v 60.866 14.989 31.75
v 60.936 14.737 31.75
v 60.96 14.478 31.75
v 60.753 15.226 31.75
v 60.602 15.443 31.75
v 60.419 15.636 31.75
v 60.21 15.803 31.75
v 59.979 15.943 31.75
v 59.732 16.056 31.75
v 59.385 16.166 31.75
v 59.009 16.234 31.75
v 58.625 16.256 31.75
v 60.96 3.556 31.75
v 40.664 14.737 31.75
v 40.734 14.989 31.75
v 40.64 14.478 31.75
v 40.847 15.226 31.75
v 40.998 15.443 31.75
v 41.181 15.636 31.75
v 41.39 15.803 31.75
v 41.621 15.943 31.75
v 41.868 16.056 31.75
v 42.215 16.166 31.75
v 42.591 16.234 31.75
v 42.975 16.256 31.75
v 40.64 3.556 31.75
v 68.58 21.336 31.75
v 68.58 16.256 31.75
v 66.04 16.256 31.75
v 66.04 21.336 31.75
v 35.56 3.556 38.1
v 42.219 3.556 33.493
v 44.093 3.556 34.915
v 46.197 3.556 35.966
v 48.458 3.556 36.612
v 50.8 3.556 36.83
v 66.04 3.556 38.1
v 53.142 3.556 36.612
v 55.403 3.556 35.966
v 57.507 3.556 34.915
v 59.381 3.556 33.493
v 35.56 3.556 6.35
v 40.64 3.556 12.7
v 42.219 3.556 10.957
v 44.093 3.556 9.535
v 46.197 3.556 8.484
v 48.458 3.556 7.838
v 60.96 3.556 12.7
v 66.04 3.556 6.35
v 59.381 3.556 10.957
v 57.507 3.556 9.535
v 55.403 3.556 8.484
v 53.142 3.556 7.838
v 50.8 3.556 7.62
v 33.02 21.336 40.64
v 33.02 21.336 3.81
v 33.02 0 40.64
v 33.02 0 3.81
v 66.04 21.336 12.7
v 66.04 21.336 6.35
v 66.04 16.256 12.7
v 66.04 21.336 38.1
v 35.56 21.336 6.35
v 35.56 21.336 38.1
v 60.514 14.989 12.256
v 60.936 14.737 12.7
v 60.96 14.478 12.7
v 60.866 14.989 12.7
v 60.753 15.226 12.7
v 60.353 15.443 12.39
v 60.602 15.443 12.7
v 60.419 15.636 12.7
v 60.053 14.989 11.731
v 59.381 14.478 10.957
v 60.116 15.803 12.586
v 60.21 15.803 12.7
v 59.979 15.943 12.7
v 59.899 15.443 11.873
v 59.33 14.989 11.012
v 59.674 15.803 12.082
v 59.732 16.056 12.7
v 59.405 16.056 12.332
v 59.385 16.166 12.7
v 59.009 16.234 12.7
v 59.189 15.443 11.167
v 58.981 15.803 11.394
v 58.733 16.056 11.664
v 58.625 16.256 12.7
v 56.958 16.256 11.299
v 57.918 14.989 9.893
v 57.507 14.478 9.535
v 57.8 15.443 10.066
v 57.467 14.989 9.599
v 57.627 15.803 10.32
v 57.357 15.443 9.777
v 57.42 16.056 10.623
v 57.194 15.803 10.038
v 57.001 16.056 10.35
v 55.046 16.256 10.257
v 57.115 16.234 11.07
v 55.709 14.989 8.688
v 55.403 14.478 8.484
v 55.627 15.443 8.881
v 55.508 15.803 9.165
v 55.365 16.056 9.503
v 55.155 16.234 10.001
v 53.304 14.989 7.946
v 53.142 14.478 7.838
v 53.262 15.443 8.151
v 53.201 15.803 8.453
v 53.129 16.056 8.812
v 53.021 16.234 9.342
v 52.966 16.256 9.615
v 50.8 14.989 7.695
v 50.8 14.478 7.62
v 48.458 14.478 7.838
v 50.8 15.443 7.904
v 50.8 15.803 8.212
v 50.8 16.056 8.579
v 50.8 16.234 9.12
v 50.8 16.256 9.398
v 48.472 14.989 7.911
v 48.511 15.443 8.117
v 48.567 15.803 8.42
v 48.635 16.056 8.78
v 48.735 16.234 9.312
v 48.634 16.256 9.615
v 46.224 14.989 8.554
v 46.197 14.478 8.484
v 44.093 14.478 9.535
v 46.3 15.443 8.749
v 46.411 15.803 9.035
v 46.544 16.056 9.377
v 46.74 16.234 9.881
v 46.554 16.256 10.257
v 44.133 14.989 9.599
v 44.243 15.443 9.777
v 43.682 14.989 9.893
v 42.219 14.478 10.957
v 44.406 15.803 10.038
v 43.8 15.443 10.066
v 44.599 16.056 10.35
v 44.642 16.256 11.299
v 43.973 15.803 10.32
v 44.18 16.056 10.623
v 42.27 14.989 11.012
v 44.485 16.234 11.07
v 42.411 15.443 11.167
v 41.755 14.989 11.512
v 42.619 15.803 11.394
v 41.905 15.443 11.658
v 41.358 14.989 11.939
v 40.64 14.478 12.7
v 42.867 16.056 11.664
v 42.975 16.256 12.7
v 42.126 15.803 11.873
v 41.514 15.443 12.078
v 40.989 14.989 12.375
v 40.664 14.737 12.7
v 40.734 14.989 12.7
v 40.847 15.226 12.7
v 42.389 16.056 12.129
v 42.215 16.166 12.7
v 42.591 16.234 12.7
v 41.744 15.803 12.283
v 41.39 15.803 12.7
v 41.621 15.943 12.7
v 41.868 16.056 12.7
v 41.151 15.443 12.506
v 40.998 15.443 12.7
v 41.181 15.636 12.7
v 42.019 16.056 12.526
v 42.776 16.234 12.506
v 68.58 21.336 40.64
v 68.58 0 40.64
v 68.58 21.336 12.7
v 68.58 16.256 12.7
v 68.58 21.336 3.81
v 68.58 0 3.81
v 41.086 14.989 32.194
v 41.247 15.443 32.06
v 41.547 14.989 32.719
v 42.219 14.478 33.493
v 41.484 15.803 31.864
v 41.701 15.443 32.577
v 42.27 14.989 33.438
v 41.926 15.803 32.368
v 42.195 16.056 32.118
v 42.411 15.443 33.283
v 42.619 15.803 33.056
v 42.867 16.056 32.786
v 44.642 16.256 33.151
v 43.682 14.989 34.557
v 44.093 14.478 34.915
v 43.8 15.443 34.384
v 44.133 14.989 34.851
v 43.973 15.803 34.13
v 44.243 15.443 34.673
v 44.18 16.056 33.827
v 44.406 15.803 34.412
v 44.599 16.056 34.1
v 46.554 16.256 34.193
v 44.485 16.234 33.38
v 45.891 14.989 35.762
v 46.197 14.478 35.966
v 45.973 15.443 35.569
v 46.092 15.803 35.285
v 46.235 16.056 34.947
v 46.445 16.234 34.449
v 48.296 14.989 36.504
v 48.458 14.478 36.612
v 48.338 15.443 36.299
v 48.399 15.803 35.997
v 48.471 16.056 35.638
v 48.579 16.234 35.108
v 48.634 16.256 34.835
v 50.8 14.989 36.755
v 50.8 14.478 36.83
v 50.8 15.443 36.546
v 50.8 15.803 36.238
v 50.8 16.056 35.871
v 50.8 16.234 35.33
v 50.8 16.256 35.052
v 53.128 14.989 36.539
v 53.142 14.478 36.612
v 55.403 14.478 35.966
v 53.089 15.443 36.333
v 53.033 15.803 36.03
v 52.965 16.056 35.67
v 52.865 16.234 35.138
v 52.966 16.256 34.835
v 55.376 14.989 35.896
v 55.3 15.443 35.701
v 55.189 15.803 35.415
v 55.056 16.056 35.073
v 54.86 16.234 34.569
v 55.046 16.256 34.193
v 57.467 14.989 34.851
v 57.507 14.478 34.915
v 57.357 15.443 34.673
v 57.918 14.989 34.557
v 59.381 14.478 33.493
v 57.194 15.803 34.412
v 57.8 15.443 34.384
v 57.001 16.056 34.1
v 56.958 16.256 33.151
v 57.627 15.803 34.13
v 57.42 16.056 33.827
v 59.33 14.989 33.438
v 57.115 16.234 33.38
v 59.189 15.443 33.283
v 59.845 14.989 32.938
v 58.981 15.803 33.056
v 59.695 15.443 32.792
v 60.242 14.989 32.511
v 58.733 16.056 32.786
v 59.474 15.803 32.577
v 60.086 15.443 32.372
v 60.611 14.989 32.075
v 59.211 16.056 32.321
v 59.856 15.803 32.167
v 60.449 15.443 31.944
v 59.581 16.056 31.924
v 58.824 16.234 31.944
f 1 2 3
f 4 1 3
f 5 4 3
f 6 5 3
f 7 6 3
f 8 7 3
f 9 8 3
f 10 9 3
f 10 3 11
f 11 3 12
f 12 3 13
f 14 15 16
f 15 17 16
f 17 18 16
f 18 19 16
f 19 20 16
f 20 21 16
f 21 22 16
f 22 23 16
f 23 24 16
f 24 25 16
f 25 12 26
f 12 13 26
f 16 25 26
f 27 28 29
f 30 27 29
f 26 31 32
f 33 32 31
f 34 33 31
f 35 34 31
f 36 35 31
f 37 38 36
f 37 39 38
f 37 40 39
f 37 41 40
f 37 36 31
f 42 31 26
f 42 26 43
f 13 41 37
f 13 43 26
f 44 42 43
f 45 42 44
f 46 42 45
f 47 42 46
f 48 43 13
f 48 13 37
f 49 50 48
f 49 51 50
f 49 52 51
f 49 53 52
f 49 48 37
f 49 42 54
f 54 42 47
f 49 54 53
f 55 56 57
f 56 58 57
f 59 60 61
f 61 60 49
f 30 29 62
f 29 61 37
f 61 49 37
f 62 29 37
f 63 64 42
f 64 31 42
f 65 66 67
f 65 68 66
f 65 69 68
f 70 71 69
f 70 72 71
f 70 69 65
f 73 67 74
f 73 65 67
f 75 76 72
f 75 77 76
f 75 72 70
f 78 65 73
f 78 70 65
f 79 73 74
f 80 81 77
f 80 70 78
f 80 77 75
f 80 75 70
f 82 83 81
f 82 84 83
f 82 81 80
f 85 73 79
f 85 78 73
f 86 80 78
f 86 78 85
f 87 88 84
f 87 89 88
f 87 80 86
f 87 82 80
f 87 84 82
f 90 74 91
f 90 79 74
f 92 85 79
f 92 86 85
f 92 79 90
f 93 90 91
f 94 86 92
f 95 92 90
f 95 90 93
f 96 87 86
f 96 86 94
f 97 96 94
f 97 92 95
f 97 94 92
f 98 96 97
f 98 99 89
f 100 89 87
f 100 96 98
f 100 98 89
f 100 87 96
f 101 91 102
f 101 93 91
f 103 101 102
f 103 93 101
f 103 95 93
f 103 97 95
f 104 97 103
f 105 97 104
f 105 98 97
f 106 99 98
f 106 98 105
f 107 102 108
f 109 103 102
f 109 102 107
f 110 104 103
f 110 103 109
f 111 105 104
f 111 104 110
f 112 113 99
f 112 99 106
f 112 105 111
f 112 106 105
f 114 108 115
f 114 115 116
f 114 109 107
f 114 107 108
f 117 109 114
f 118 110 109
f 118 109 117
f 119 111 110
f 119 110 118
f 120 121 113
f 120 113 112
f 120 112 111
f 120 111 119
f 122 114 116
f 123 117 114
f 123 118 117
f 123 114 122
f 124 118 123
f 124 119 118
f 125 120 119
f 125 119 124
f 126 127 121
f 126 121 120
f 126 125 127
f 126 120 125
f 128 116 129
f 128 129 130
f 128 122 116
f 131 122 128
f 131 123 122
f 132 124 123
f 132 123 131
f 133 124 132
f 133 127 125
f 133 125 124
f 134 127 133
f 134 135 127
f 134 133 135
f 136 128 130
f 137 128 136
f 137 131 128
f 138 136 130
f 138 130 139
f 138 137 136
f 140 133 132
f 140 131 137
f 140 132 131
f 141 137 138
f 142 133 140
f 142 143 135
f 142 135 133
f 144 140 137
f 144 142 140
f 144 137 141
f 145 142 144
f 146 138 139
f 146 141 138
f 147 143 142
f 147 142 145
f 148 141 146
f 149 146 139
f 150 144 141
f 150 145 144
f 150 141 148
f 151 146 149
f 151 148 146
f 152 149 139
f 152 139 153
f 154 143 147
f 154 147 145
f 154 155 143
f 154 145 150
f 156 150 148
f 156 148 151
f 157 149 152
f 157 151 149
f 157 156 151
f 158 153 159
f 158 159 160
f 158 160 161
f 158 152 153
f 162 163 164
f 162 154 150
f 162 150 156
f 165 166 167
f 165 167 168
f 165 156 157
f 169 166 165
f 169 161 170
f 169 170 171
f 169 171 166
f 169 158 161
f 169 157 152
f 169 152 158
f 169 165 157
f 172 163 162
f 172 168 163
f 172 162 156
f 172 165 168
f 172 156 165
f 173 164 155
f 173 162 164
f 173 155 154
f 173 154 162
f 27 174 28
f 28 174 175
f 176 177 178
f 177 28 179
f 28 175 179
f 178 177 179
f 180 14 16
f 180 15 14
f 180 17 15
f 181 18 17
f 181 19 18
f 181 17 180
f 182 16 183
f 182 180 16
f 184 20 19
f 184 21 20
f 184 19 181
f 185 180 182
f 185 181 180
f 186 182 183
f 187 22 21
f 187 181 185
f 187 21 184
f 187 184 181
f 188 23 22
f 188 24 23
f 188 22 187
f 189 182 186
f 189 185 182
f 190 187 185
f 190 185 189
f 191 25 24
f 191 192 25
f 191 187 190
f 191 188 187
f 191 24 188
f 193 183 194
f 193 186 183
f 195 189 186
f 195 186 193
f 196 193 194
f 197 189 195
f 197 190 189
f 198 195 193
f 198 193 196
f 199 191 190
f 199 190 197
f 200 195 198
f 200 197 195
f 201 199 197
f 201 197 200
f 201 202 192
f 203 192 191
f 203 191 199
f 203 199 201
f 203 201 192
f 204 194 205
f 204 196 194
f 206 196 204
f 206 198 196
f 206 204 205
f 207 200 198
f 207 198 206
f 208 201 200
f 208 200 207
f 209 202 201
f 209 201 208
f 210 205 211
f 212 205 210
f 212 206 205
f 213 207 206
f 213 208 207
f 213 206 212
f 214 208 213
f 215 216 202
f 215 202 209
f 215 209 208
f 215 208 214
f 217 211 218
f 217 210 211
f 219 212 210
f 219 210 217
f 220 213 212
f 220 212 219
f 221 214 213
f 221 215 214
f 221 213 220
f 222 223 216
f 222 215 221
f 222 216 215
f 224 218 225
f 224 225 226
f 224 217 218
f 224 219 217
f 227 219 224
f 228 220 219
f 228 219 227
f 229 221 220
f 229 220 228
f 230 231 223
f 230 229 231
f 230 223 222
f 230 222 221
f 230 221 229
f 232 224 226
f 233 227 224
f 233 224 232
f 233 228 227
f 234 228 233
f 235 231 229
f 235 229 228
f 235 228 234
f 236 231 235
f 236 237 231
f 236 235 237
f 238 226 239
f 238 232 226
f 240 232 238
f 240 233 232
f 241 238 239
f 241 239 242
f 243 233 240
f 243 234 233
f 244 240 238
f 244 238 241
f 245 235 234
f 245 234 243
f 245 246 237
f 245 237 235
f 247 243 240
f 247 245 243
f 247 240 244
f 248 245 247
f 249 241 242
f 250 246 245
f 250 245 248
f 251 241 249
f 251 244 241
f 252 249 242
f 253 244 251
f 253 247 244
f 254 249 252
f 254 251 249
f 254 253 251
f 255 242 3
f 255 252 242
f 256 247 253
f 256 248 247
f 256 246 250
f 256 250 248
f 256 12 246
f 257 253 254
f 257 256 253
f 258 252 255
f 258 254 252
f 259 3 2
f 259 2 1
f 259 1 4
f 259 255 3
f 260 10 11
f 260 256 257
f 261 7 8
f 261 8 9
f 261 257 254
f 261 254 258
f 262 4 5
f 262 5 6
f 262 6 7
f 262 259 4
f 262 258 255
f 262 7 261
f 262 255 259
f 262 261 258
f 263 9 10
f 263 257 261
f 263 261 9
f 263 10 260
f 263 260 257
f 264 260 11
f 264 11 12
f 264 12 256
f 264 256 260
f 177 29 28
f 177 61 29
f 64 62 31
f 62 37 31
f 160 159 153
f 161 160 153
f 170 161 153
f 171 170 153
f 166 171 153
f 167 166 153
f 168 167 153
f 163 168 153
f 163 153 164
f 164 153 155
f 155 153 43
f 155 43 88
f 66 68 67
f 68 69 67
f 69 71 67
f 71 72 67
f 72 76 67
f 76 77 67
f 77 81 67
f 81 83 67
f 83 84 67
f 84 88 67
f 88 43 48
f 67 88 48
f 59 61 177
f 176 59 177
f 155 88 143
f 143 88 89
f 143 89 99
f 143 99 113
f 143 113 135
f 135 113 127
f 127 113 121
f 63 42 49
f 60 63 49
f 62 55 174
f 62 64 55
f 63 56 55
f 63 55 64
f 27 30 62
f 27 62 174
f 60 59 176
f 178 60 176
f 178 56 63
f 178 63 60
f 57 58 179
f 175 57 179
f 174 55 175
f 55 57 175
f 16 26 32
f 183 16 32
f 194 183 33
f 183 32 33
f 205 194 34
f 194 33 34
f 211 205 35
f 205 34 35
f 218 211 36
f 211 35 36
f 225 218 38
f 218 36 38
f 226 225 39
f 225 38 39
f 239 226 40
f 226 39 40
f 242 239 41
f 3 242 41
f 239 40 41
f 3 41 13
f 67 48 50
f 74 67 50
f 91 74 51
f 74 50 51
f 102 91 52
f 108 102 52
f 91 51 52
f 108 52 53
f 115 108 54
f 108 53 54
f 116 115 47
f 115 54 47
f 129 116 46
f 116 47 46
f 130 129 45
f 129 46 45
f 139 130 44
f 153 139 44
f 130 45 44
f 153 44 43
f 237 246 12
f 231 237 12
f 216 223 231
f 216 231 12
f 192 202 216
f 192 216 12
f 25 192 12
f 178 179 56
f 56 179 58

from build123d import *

# Parameters (mm, degrees)
SKETCH1_W            = 30.48
SKETCH1_H            = 31.75
BOSS_EXTRUDE1_DEPTH  = 3.556
BOSS_EXTRUDE2_DEPTH  = 12.7
SKETCH4_W            = 69.596
SKETCH4_H            = 73.406
BOSS_EXTRUDE3_DEPTH  = 3.556
BOSS_EXTRUDE5_DEPTH  = 12.7
MIRROR2_COPY_1_DEPTH = 12.7
MIRROR4_COPY_1_DEPTH = 12.7
FILLET5_R            = 1.778
BOSS_EXTRUDE7_REACH  = 82.336
SKETCH9_W            = 1.524
SKETCH9_H            = 35.306
SKETCH9_H_2          = 2.794
SKETCH9_W_2          = 34.036
CUT_EXTRUDE1_DEPTH   = 81.335506123
SKETCH11_W           = 35.56
SKETCH11_H           = 36.83
SKETCH11_W_2         = 34.036
SKETCH11_H_2         = 35.306
BOSS_EXTRUDE8_DEPTH  = 16.256
BOSS_EXTRUDE9_DEPTH  = 5.08


with BuildPart() as part:
    # Sketch1 → Boss-Extrude1 (new body)
    with BuildSketch(Plane(origin=(0, 0, 0), x_dir=(1, 0, 0), z_dir=(0, 1, 0))):
        with Locations((15.24, 15.875)):
            Rectangle(SKETCH1_W, SKETCH1_H)
    extrude(amount=BOSS_EXTRUDE1_DEPTH)

    # Sketch2 → Boss-Extrude2 (add)
    with BuildSketch(Plane(origin=(0, 3.556, 0), x_dir=(1, 0, 0), z_dir=(0, 1, 0))):
        with BuildLine():
            Line((25.4, 6.35), (5.08, 6.35))
            ThreePointArc((5.08, 6.35), (15.24, 1.27), (25.4, 6.35))
        make_face()
        with BuildLine():
            ThreePointArc((25.4, 25.4), (15.24, 30.48), (5.08, 25.4))
            Line((5.08, 25.4), (25.4, 25.4))
        make_face()
    boss_extrude2 = extrude(amount=BOSS_EXTRUDE2_DEPTH)

    # Sketch4 → Boss-Extrude3 (add)
    with BuildSketch(Plane(origin=(0, 3.556, 0), x_dir=(1, 0, 0), z_dir=(0, 1, 0))):
        with Locations((33.02, -3.175)):
            Rectangle(SKETCH4_W, SKETCH4_H)
    extrude(amount=-BOSS_EXTRUDE3_DEPTH)

    # Sketch8 → Boss-Extrude5 (add)
    with BuildSketch(Plane(origin=(0, 3.556, 0), x_dir=(1, 0, 0), z_dir=(0, 1, 0))):
        Polygon((-1.778, 33.528), (-1.778, 27.178), (-1.778, 4.572), (-1.778, -1.778), (32.258, -1.778), (32.258, 33.528), align=None)
        Polygon((0, 27.178), (0, 31.75), (30.48, 31.75), (30.48, 0), (0, 0), (0, 4.572), align=None, mode=Mode.SUBTRACT)
    boss_extrude5 = extrude(amount=BOSS_EXTRUDE5_DEPTH)

    # Mirror1: Boss-Extrude5 across plane
    add(boss_extrude5.mirror(Plane(origin=(0, 0, 3.175), x_dir=(1, 0, 0), z_dir=(0, 0, -1))))

    # Mirror2: Boss-Extrude5 across plane
    add(boss_extrude5.mirror(Plane(origin=(33.02, 0, 0), x_dir=(0, 0, 1), z_dir=(1, 0, 0))))

    # Mirror2 copy 1 sketch → Mirror2 copy 1 (add)
    with BuildSketch(Plane(origin=(66.04, 3.556, 6.35), x_dir=(-1, 0, 0), z_dir=(0, 1, 0))):
        Polygon((-1.778, 33.528), (-1.778, 27.178), (-1.778, 4.572), (-1.778, -1.778), (32.258, -1.778), (32.258, 33.528), align=None)
        Polygon((0, 27.178), (0, 31.75), (30.48, 31.75), (30.48, 0), (0, 0), (0, 4.572), align=None, mode=Mode.SUBTRACT)
    extrude(amount=MIRROR2_COPY_1_DEPTH)

    # Mirror3: Boss-Extrude2 across plane
    add(boss_extrude2.mirror(Plane(origin=(0, 0, 3.175), x_dir=(1, 0, 0), z_dir=(0, 0, -1))))

    # Mirror4: Boss-Extrude2 across plane
    add(boss_extrude2.mirror(Plane(origin=(33.02, 0, 0), x_dir=(0, 0, 1), z_dir=(1, 0, 0))))

    # Mirror4 copy 1 sketch → Mirror4 copy 1 (add)
    with BuildSketch(Plane(origin=(66.04, 3.556, 6.35), x_dir=(-1, 0, 0), z_dir=(0, 1, 0))):
        with BuildLine():
            Line((25.4, 6.35), (5.08, 6.35))
            ThreePointArc((5.08, 6.35), (15.24, 1.27), (25.4, 6.35))
        make_face()
        with BuildLine():
            ThreePointArc((25.4, 25.4), (15.24, 30.48), (5.08, 25.4))
            Line((5.08, 25.4), (25.4, 25.4))
        make_face()
    extrude(amount=MIRROR4_COPY_1_DEPTH)

    # Fillet5
    fillet5_edges = [part.edges().sort_by_distance(p)[0] for p in [
        (15.24, 16.256, -1.27),
        (15.24, 16.256, 7.62),
        (15.24, 16.256, 36.83),
        (50.8, 16.256, 7.62),
        (50.8, 16.256, 36.83),
        (50.8, 16.256, -1.27),
        (50.8, 16.256, -30.48),
        (15.24, 16.256, -30.48),
    ]]
    fillet(fillet5_edges, radius=FILLET5_R)

    # Sketch9 → Boss-Extrude7 (add, up to next)
    with BuildSketch(Plane(origin=(0, 16.256, 0), x_dir=(1, 0, 0), z_dir=(0, 1, 0)), mode=Mode.PRIVATE) as boss_extrude7_sk1:
        with Locations((33.02, 15.875)):
            Rectangle(SKETCH9_W, SKETCH9_H)
    boss_extrude7_tool1 = extrude(boss_extrude7_sk1.sketch, amount=-BOSS_EXTRUDE7_REACH, mode=Mode.PRIVATE) - part.part
    # Sketch9 → Boss-Extrude7 (add, up to next)
    with BuildSketch(Plane(origin=(0, 16.256, 0), x_dir=(1, 0, 0), z_dir=(0, 1, 0)), mode=Mode.PRIVATE) as boss_extrude7_sk2:
        with Locations((33.02, -22.225)):
            Rectangle(SKETCH9_W, SKETCH9_H)
    boss_extrude7_tool2 = extrude(boss_extrude7_sk2.sketch, amount=-BOSS_EXTRUDE7_REACH, mode=Mode.PRIVATE) - part.part
    # Sketch9 → Boss-Extrude7 (add, up to next)
    with BuildSketch(Plane(origin=(0, 16.256, 0), x_dir=(1, 0, 0), z_dir=(0, 1, 0)), mode=Mode.PRIVATE) as boss_extrude7_sk3:
        with Locations((33.02, -3.175)):
            Rectangle(SKETCH9_W, SKETCH9_H_2)
    boss_extrude7_tool3 = extrude(boss_extrude7_sk3.sketch, amount=-BOSS_EXTRUDE7_REACH, mode=Mode.PRIVATE) - part.part
    # Sketch9 → Boss-Extrude7 (add, up to next)
    with BuildSketch(Plane(origin=(0, 16.256, 0), x_dir=(1, 0, 0), z_dir=(0, 1, 0)), mode=Mode.PRIVATE) as boss_extrude7_sk4:
        with Locations((50.8, -3.175)):
            Rectangle(SKETCH9_W_2, SKETCH9_H_2)
    boss_extrude7_tool4 = extrude(boss_extrude7_sk4.sketch, amount=-BOSS_EXTRUDE7_REACH, mode=Mode.PRIVATE) - part.part
    # Sketch9 → Boss-Extrude7 (add, up to next)
    with BuildSketch(Plane(origin=(0, 16.256, 0), x_dir=(1, 0, 0), z_dir=(0, 1, 0)), mode=Mode.PRIVATE) as boss_extrude7_sk5:
        with Locations((15.24, -3.175)):
            Rectangle(SKETCH9_W_2, SKETCH9_H_2)
    boss_extrude7_tool5 = extrude(boss_extrude7_sk5.sketch, amount=-BOSS_EXTRUDE7_REACH, mode=Mode.PRIVATE) - part.part
    add(boss_extrude7_tool1.solids().sort_by_distance((33.02, 16.256, -15.875))[0])
    add(boss_extrude7_tool2.solids().sort_by_distance((33.02, 16.256, 22.225))[0])
    add(boss_extrude7_tool3.solids().sort_by_distance((33.02, 16.256, 3.175))[0])
    add(boss_extrude7_tool4.solids().sort_by_distance((50.8, 16.256, 3.175))[0])
    add(boss_extrude7_tool5.solids().sort_by_distance((15.24, 16.256, 3.175))[0])

    # Sketch10 → Cut-Extrude1 (cut, through all)
    with BuildSketch(Plane(origin=(0, 16.256, 0), x_dir=(1, 0, 0), z_dir=(0, 1, 0))):
        Polygon((67.818, -4.572), (33.782, -4.572), (33.782, -39.878), (-10.061280672, -39.878), (-10.061280672, 34.690827012), (71.018790947, 34.690827012), (71.018790947, -4.572), align=None)
    extrude(amount=-CUT_EXTRUDE1_DEPTH, mode=Mode.SUBTRACT)

    # Sketch11 → Boss-Extrude8 (add)
    with BuildSketch(Plane(origin=(0, 16.256, 0), x_dir=(1, 0, 0), z_dir=(0, 1, 0))):
        with Locations((50.8, -22.225)):
            Rectangle(SKETCH11_W, SKETCH11_H)
        with Locations((50.8, -22.225)):
            Rectangle(SKETCH11_W_2, SKETCH11_H_2, mode=Mode.SUBTRACT)
    extrude(amount=-BOSS_EXTRUDE8_DEPTH)

    # Sketch12 → Boss-Extrude9 (add)
    with BuildSketch(Plane(origin=(0, 16.256, 0), x_dir=(1, 0, 0), z_dir=(0, 1, 0))):
        Polygon((66.04, -12.7), (68.58, -12.7), (68.58, -3.81), (33.02, -3.81), (33.02, -40.64), (68.58, -40.64), (68.58, -31.75), (66.04, -31.75), (66.04, -38.1), (35.56, -38.1), (35.56, -6.35), (66.04, -6.35), align=None)
    extrude(amount=BOSS_EXTRUDE9_DEPTH)


solid = part.part
